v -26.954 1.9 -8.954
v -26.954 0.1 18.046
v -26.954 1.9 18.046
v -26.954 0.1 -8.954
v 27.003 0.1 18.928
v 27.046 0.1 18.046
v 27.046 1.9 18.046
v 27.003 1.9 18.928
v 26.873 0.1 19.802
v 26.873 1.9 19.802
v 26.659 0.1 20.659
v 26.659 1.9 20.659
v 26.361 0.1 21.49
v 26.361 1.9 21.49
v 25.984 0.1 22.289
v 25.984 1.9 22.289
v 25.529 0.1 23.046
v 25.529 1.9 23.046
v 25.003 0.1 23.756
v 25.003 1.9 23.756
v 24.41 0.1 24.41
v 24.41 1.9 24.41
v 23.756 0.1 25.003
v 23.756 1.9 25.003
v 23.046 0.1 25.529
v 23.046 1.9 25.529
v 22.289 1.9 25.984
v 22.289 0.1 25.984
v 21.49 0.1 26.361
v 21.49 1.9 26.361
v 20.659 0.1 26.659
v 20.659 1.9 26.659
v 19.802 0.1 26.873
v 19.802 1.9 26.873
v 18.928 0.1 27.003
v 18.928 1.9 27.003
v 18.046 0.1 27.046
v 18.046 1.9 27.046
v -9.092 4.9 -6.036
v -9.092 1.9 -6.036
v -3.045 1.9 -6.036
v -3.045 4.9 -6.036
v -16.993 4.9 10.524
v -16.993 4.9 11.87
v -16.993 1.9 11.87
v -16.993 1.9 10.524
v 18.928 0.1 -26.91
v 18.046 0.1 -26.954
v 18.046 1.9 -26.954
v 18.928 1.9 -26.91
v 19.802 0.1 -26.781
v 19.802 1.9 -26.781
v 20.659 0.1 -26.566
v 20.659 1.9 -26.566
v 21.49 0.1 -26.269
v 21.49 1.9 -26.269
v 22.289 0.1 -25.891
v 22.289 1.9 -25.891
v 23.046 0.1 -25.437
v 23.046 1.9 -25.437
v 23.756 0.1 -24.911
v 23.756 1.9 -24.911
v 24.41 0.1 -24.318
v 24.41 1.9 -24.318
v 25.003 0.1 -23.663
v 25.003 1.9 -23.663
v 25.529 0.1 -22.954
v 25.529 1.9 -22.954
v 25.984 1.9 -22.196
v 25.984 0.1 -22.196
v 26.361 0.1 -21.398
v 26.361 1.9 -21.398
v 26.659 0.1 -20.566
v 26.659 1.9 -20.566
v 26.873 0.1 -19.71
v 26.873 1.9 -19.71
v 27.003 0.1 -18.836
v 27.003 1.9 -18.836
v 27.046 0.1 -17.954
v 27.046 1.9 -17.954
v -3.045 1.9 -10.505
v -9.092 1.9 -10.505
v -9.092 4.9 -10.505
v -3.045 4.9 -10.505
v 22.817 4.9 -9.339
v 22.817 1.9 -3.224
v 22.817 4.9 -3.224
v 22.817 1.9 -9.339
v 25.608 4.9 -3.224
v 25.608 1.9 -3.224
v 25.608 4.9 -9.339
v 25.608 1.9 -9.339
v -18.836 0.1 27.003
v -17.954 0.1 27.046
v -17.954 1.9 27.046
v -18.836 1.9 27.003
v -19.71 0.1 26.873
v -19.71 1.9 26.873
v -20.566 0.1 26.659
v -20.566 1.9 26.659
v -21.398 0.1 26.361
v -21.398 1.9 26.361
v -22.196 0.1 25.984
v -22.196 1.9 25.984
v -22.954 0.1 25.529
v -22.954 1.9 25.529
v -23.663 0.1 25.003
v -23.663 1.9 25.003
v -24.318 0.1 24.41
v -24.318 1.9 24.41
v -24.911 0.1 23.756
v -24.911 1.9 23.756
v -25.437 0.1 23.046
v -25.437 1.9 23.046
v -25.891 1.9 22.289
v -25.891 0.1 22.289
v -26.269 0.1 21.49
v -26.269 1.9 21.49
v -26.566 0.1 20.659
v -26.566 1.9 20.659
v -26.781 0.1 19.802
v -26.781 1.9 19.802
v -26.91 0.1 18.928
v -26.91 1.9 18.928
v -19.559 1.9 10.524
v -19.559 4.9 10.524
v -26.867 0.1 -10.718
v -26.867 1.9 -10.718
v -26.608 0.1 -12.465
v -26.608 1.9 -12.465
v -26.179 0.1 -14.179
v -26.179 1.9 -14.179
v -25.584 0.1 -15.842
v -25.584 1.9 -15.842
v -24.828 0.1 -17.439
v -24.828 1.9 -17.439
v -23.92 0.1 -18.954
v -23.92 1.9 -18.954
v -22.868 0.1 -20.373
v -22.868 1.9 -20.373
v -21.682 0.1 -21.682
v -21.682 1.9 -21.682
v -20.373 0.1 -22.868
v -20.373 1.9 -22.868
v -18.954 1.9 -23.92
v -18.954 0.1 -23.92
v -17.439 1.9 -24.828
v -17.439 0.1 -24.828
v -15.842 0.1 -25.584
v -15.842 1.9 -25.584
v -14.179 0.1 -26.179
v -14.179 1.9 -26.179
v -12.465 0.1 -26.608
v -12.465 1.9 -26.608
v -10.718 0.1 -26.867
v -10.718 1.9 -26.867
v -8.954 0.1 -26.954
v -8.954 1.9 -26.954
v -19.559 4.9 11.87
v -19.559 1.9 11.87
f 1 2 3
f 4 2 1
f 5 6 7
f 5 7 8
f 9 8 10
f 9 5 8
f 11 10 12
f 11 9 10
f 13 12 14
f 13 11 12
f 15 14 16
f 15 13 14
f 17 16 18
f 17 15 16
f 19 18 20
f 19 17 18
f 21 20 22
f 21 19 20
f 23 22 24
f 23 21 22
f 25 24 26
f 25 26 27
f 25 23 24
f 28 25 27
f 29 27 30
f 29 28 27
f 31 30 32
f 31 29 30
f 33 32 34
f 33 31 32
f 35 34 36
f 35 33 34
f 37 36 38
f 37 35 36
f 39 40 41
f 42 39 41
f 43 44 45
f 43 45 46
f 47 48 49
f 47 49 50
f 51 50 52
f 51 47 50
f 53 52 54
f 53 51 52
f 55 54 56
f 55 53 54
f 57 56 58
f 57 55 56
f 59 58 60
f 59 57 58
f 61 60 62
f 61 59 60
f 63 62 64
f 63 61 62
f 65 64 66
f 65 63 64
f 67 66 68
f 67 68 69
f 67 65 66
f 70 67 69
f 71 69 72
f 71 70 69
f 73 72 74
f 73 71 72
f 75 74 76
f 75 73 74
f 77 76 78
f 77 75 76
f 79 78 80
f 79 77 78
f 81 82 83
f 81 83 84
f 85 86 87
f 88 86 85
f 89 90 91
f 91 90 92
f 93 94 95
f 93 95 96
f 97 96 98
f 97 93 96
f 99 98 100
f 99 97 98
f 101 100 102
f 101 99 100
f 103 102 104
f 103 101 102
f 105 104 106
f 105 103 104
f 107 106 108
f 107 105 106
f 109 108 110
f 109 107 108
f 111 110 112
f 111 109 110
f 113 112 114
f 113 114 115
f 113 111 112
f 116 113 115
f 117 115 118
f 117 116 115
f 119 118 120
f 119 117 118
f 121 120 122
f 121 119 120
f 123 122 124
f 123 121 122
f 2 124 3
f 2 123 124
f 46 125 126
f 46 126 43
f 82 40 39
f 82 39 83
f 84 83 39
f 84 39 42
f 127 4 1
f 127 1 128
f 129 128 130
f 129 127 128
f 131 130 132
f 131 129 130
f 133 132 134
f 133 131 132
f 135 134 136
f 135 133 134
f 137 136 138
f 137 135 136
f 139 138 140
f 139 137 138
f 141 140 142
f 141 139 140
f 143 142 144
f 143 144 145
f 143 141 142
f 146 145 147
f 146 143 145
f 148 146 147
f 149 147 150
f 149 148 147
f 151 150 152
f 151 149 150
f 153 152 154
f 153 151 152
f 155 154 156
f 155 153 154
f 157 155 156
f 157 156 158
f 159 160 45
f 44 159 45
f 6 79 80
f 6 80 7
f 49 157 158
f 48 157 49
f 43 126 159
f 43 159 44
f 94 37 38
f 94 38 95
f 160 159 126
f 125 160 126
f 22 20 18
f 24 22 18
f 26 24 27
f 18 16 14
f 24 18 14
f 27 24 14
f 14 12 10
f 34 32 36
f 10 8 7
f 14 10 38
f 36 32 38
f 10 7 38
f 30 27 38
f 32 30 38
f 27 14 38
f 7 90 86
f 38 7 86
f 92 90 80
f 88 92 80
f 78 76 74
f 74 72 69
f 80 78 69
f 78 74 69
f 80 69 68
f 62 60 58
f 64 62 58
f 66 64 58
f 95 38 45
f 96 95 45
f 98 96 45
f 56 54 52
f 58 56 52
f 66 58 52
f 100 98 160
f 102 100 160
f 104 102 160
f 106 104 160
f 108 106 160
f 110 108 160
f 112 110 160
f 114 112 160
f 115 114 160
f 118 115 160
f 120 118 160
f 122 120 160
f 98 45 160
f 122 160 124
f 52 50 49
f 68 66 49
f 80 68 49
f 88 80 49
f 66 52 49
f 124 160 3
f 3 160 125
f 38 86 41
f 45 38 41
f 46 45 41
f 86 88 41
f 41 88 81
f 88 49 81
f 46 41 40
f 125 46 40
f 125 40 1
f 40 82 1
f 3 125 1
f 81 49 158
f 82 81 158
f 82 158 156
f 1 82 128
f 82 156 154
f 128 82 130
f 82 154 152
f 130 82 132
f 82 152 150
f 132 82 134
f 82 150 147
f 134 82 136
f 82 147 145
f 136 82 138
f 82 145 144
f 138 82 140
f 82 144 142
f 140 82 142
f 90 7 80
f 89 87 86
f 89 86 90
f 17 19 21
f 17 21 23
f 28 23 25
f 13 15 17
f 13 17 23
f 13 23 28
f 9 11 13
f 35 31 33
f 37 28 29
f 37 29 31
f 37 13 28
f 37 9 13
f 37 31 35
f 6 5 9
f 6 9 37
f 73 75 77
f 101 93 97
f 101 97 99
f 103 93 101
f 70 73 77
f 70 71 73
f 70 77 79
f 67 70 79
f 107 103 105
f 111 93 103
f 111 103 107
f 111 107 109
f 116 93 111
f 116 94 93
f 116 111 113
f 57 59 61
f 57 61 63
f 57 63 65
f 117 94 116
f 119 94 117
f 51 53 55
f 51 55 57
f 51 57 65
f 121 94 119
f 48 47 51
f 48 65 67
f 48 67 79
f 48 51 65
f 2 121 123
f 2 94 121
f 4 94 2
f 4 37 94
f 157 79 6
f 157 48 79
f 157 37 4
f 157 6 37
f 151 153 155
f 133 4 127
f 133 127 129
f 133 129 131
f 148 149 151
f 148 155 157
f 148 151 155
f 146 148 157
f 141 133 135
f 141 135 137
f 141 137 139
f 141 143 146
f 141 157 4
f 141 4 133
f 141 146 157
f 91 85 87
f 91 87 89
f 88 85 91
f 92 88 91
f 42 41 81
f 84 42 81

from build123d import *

# Parameters (mm, degrees)
BOSS_EXTRUDE1_DEPTH = 2
SCALE1_SCALE        = 0.9
SKETCH3_W           = 6.046779213
SKETCH3_H           = 4.468776405
BOSS_EXTRUDE2_DEPTH = 3
SKETCH4_W           = 2.790397576
SKETCH4_H           = 6.115363286
BOSS_EXTRUDE3_DEPTH = 3
SKETCH5_W           = 2.56611171
SKETCH5_H           = 1.346193589
BOSS_EXTRUDE4_DEPTH = 3


with BuildPart() as part:
    # Sketch2 → Boss-Extrude1 (new body)
    with BuildSketch(Plane(origin=(0, 0, 0), x_dir=(1, 0, 0), z_dir=(0, 1, 0))):
        with BuildLine():
            Line((-10, 30), (20, 30))
            ThreePointArc((20, 30), (27.071067812, 27.071067812), (30, 20))
            Line((30, 20), (30, -20))
            ThreePointArc((30, -20), (27.071067812, -27.071067812), (20, -30))
            Line((20, -30), (-20, -30))
            ThreePointArc((-20, -30), (-27.071067812, -27.071067812), (-30, -20))
            Line((-30, -20), (-30, 10))
            ThreePointArc((-30, 10), (-24.142135624, 24.142135624), (-10, 30))
        make_face()
    extrude(amount=BOSS_EXTRUDE1_DEPTH)


with BuildPart() as part_1:
    # Scale1: scaled about (0.462600785, 1, 0.462600785)
    add(part.part.scale(SCALE1_SCALE).moved(Location((0.046260078, 0.1, 0.046260078))))

    # Sketch3 → Boss-Extrude2 (add)
    with BuildSketch(Plane(origin=(0, 1.9, 0), x_dir=(1, 0, 0), z_dir=(0, 1, 0))):
        with Locations((-6.068725182, 8.270529837)):
            Rectangle(SKETCH3_W, SKETCH3_H)
    extrude(amount=BOSS_EXTRUDE2_DEPTH)

    # Sketch4 → Boss-Extrude3 (add)
    with BuildSketch(Plane(origin=(0, 1.9, 0), x_dir=(1, 0, 0), z_dir=(0, 1, 0))):
        with Locations((24.212308402, 6.281277774)):
            Rectangle(SKETCH4_W, SKETCH4_H)
    extrude(amount=BOSS_EXTRUDE3_DEPTH)

    # Sketch5 → Boss-Extrude4 (add)
    with BuildSketch(Plane(origin=(0, 1.9, 0), x_dir=(1, 0, 0), z_dir=(0, 1, 0))):
        with Locations((-18.275730646, -11.196811513)):
            Rectangle(SKETCH5_W, SKETCH5_H)
    extrude(amount=BOSS_EXTRUDE4_DEPTH)


solid = part_1.part
